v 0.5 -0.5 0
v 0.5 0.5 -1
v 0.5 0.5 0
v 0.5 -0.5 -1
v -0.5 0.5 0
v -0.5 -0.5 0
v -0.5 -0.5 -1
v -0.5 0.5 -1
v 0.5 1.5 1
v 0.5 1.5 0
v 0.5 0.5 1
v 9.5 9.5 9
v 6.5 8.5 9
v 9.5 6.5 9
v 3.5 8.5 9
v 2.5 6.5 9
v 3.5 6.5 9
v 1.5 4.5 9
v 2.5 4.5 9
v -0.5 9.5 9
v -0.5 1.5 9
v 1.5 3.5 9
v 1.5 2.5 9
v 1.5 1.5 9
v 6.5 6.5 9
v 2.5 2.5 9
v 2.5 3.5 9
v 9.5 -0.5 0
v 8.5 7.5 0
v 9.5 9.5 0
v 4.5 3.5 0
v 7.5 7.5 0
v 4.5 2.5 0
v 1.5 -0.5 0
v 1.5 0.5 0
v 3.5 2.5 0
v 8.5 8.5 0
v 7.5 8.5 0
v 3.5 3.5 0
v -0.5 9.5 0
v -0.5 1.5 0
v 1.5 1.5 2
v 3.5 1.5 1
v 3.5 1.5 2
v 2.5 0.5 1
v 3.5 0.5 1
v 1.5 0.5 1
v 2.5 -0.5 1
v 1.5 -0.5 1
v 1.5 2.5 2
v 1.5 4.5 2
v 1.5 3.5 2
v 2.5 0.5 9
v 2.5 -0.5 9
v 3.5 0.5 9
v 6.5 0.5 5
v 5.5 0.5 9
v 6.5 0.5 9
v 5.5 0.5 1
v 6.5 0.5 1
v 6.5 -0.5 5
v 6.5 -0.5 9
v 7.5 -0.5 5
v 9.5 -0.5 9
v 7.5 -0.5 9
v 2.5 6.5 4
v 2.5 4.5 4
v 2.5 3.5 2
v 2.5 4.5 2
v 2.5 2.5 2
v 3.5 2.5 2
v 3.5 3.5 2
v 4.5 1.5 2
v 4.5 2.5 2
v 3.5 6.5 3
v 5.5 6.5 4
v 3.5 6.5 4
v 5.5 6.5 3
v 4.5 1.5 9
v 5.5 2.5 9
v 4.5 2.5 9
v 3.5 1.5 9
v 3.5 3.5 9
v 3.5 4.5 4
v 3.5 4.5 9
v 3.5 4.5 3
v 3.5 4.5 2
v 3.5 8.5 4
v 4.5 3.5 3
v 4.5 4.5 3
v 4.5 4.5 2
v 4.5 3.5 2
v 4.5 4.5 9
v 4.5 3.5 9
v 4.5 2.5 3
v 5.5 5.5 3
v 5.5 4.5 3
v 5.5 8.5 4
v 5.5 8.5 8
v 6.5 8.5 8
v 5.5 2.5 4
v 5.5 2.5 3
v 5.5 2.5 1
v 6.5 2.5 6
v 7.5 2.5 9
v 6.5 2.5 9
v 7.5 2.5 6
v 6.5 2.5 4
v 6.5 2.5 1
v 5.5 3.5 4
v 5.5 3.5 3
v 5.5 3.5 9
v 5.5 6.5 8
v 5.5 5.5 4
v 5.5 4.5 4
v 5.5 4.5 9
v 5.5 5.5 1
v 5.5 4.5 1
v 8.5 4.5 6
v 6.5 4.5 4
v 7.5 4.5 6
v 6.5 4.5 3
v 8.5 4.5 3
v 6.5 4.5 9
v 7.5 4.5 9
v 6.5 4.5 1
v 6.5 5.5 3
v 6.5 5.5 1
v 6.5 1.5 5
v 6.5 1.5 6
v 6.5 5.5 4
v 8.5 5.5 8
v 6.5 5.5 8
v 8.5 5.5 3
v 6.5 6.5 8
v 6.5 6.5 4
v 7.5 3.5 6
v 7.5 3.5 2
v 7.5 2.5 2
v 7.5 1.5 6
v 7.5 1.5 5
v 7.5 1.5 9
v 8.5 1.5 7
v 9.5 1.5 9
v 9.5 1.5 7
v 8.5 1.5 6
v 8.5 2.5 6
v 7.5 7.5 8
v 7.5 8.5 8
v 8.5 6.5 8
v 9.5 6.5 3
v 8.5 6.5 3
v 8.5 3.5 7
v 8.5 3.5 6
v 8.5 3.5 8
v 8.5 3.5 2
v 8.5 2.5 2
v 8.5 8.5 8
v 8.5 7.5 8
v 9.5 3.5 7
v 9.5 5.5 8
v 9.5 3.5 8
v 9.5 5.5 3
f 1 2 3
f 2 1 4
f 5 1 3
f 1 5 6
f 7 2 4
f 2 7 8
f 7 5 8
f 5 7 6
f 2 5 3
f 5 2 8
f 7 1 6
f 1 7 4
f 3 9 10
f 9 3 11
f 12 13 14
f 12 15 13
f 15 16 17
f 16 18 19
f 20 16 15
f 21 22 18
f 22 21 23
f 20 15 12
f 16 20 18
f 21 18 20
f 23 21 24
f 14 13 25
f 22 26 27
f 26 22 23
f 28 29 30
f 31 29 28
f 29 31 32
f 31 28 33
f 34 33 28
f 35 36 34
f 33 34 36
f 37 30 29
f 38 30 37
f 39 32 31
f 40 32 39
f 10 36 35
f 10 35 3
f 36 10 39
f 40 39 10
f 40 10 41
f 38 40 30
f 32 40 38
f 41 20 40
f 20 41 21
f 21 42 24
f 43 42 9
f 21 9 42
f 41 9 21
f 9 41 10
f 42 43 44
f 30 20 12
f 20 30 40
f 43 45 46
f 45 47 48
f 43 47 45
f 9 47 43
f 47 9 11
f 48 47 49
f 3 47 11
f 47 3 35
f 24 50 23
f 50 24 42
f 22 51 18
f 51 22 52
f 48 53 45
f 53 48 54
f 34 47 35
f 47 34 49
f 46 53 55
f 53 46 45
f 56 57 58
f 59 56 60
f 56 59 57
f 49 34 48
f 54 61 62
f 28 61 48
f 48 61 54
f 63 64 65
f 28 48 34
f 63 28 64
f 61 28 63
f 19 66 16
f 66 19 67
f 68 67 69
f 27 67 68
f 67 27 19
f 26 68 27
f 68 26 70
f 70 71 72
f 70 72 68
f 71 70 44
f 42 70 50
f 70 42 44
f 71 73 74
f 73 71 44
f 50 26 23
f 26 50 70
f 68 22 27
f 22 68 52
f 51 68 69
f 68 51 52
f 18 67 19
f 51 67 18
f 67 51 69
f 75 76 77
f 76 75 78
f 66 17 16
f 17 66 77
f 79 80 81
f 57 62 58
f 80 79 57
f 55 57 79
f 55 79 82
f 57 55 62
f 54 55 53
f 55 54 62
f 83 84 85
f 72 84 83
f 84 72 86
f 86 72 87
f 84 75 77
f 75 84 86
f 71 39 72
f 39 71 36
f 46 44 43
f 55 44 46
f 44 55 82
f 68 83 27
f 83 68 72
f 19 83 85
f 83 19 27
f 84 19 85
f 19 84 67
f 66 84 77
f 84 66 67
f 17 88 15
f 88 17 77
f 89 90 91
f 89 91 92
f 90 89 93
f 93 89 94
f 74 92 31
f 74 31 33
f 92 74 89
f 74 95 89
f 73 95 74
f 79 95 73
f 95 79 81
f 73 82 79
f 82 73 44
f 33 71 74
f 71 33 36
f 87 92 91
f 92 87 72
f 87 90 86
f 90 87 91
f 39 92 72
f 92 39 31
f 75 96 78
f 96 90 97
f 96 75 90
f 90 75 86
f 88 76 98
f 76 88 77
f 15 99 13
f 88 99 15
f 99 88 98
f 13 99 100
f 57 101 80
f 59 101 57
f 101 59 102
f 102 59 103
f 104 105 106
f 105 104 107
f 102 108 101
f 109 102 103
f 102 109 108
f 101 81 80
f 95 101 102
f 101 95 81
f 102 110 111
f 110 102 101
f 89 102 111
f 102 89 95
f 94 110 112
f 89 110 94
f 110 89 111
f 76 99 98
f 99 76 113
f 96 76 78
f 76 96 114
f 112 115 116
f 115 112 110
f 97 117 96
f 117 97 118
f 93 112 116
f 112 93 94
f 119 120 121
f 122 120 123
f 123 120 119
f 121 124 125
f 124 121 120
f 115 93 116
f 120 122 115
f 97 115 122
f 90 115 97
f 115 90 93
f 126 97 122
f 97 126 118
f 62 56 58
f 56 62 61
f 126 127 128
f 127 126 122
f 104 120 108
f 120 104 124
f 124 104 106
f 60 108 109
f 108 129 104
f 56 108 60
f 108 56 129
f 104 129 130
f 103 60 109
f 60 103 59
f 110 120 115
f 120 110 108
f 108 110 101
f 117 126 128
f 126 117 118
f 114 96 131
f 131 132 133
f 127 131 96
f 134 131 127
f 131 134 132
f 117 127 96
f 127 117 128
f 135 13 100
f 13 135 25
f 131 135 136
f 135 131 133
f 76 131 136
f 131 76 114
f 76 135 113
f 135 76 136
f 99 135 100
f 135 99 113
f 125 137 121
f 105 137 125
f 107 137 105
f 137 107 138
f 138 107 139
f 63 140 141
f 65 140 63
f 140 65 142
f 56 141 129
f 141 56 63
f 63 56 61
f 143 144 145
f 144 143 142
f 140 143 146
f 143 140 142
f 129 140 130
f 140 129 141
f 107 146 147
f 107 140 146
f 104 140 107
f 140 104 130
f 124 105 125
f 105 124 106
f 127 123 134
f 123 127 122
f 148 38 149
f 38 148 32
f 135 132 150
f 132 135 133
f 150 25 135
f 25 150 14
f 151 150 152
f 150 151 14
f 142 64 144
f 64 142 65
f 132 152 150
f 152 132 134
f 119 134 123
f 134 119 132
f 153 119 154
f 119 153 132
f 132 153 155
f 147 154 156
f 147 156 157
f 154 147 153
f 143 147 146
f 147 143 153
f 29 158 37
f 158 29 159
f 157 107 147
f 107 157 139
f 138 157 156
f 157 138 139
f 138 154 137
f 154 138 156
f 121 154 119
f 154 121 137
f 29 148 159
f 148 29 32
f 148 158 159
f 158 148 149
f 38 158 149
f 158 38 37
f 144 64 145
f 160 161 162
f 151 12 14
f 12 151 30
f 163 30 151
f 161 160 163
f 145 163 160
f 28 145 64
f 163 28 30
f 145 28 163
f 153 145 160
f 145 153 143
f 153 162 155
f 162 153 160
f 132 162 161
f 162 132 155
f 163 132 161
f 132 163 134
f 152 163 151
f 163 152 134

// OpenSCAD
union() {
    translate([0, 0, -0.5]) color([1, 0, 0]) cube([1, 1, 1], center=true);
    translate([0, 2, 4.5]) cube([1, 1, 9], center=true);
    translate([0, 3, 4.5]) cube([1, 1, 9], center=true);
    translate([0, 4, 4.5]) cube([1, 1, 9], center=true);
    translate([0, 5, 4.5]) cube([1, 1, 9], center=true);
    translate([0, 6, 4.5]) cube([1, 1, 9], center=true);
    translate([0, 7, 4.5]) cube([1, 1, 9], center=true);
    translate([0, 8, 4.5]) cube([1, 1, 9], center=true);
    translate([0, 9, 4.5]) cube([1, 1, 9], center=true);
    translate([1, 1, 0.5]) cube([1, 1, 1], center=true);
    translate([1, 2, 4.5]) cube([1, 1, 9], center=true);
    translate([1, 3, 4.5]) cube([1, 1, 9], center=true);
    translate([1, 4, 4.5]) cube([1, 1, 9], center=true);
    translate([1, 5, 4.5]) cube([1, 1, 9], center=true);
    translate([1, 6, 4.5]) cube([1, 1, 9], center=true);
    translate([1, 7, 4.5]) cube([1, 1, 9], center=true);
    translate([1, 8, 4.5]) cube([1, 1, 9], center=true);
    translate([1, 9, 4.5]) cube([1, 1, 9], center=true);
    translate([2, 0, 0.5]) cube([1, 1, 1], center=true);
    translate([2, 1, 0.5]) cube([1, 1, 1], center=true);
    translate([2, 2, 1.0]) cube([1, 1, 2], center=true);
    translate([2, 3, 4.5]) cube([1, 1, 9], center=true);
    translate([2, 4, 1.0]) cube([1, 1, 2], center=true);
    translate([2, 5, 4.5]) cube([1, 1, 9], center=true);
    translate([2, 6, 4.5]) cube([1, 1, 9], center=true);
    translate([2, 7, 4.5]) cube([1, 1, 9], center=true);
    translate([2, 8, 4.5]) cube([1, 1, 9], center=true);
    translate([2, 9, 4.5]) cube([1, 1, 9], center=true);
    translate([3, 0, 4.5]) cube([1, 1, 9], center=true);
    translate([3, 1, 0.5]) cube([1, 1, 1], center=true);
    translate([3, 2, 1.0]) cube([1, 1, 2], center=true);
    translate([3, 3, 1.0]) cube([1, 1, 2], center=true);
    translate([3, 4, 4.5]) cube([1, 1, 9], center=true);
    translate([3, 5, 2.0]) cube([1, 1, 4], center=true);
    translate([3, 6, 2.0]) cube([1, 1, 4], center=true);
    translate([3, 7, 4.5]) cube([1, 1, 9], center=true);
    translate([3, 8, 4.5]) cube([1, 1, 9], center=true);
    translate([3, 9, 4.5]) cube([1, 1, 9], center=true);
    translate([4, 0, 4.5]) cube([1, 1, 9], center=true);
    translate([4, 1, 4.5]) cube([1, 1, 9], center=true);
    translate([4, 2, 1.0]) cube([1, 1, 2], center=true);
    translate([4, 4, 1.0]) cube([1, 1, 2], center=true);
    translate([4, 5, 1.5]) cube([1, 1, 3], center=true);
    translate([4, 6, 1.5]) cube([1, 1, 3], center=true);
    translate([4, 7, 2.0]) cube([1, 1, 4], center=true);
    translate([4, 8, 2.0]) cube([1, 1, 4], center=true);
    translate([4, 9, 4.5]) cube([1, 1, 9], center=true);
    translate([5, 0, 4.5]) cube([1, 1, 9], center=true);
    translate([5, 1, 4.5]) cube([1, 1, 9], center=true);
    translate([5, 2, 4.5]) cube([1, 1, 9], center=true);
    translate([5, 3, 1.5]) cube([1, 1, 3], center=true);
    translate([5, 4, 4.5]) cube([1, 1, 9], center=true);
    translate([5, 5, 1.5]) cube([1, 1, 3], center=true);
    translate([5, 6, 1.5]) cube([1, 1, 3], center=true);
    translate([5, 7, 2.0]) cube([1, 1, 4], center=true);
    translate([5, 8, 2.0]) cube([1, 1, 4], center=true);
    translate([5, 9, 4.5]) cube([1, 1, 9], center=true);
    translate([6, 0, 4.5]) cube([1, 1, 9], center=true);
    translate([6, 1, 0.5]) cube([1, 1, 1], center=true);
    translate([6, 2, 0.5]) cube([1, 1, 1], center=true);
    translate([6, 3, 2.0]) cube([1, 1, 4], center=true);
    translate([6, 4, 2.0]) cube([1, 1, 4], center=true);
    translate([6, 5, 0.5]) cube([1, 1, 1], center=true);
    translate([6, 6, 2.0]) cube([1, 1, 4], center=true);
    translate([6, 7, 4.0]) cube([1, 1, 8], center=true);
    translate([6, 8, 4.0]) cube([1, 1, 8], center=true);
    translate([6, 9, 4.5]) cube([1, 1, 9], center=true);
    translate([7, 0, 2.5]) cube([1, 1, 5], center=true);
    translate([7, 1, 2.5]) cube([1, 1, 5], center=true);
    translate([7, 2, 3.0]) cube([1, 1, 6], center=true);
    translate([7, 3, 4.5]) cube([1, 1, 9], center=true);
    translate([7, 4, 4.5]) cube([1, 1, 9], center=true);
    translate([7, 5, 1.5]) cube([1, 1, 3], center=true);
    translate([7, 6, 4.0]) cube([1, 1, 8], center=true);
    translate([7, 7, 4.5]) cube([1, 1, 9], center=true);
    translate([7, 8, 4.5]) cube([1, 1, 9], center=true);
    translate([7, 9, 4.5]) cube([1, 1, 9], center=true);
    translate([8, 0, 4.5]) cube([1, 1, 9], center=true);
    translate([8, 1, 4.5]) cube([1, 1, 9], center=true);
    translate([8, 2, 3.0]) cube([1, 1, 6], center=true);
    translate([8, 3, 1.0]) cube([1, 1, 2], center=true);
    translate([8, 4, 3.0]) cube([1, 1, 6], center=true);
    translate([8, 5, 1.5]) cube([1, 1, 3], center=true);
    translate([8, 6, 4.0]) cube([1, 1, 8], center=true);
    translate([8, 7, 4.5]) cube([1, 1, 9], center=true);
    translate([8, 8, 8.5]) color([0, 0, 1]) cube([1, 1, 1], center=true);
    translate([8, 9, 4.5]) cube([1, 1, 9], center=true);
    translate([9, 0, 4.5]) cube([1, 1, 9], center=true);
    translate([9, 1, 4.5]) cube([1, 1, 9], center=true);
    translate([9, 2, 3.5]) cube([1, 1, 7], center=true);
    translate([9, 3, 3.5]) cube([1, 1, 7], center=true);
    translate([9, 4, 4.0]) cube([1, 1, 8], center=true);
    translate([9, 5, 4.0]) cube([1, 1, 8], center=true);
    translate([9, 6, 1.5]) cube([1, 1, 3], center=true);
    translate([9, 7, 4.5]) cube([1, 1, 9], center=true);
    translate([9, 8, 4.5]) cube([1, 1, 9], center=true);
    translate([9, 9, 4.5]) cube([1, 1, 9], center=true);
}
